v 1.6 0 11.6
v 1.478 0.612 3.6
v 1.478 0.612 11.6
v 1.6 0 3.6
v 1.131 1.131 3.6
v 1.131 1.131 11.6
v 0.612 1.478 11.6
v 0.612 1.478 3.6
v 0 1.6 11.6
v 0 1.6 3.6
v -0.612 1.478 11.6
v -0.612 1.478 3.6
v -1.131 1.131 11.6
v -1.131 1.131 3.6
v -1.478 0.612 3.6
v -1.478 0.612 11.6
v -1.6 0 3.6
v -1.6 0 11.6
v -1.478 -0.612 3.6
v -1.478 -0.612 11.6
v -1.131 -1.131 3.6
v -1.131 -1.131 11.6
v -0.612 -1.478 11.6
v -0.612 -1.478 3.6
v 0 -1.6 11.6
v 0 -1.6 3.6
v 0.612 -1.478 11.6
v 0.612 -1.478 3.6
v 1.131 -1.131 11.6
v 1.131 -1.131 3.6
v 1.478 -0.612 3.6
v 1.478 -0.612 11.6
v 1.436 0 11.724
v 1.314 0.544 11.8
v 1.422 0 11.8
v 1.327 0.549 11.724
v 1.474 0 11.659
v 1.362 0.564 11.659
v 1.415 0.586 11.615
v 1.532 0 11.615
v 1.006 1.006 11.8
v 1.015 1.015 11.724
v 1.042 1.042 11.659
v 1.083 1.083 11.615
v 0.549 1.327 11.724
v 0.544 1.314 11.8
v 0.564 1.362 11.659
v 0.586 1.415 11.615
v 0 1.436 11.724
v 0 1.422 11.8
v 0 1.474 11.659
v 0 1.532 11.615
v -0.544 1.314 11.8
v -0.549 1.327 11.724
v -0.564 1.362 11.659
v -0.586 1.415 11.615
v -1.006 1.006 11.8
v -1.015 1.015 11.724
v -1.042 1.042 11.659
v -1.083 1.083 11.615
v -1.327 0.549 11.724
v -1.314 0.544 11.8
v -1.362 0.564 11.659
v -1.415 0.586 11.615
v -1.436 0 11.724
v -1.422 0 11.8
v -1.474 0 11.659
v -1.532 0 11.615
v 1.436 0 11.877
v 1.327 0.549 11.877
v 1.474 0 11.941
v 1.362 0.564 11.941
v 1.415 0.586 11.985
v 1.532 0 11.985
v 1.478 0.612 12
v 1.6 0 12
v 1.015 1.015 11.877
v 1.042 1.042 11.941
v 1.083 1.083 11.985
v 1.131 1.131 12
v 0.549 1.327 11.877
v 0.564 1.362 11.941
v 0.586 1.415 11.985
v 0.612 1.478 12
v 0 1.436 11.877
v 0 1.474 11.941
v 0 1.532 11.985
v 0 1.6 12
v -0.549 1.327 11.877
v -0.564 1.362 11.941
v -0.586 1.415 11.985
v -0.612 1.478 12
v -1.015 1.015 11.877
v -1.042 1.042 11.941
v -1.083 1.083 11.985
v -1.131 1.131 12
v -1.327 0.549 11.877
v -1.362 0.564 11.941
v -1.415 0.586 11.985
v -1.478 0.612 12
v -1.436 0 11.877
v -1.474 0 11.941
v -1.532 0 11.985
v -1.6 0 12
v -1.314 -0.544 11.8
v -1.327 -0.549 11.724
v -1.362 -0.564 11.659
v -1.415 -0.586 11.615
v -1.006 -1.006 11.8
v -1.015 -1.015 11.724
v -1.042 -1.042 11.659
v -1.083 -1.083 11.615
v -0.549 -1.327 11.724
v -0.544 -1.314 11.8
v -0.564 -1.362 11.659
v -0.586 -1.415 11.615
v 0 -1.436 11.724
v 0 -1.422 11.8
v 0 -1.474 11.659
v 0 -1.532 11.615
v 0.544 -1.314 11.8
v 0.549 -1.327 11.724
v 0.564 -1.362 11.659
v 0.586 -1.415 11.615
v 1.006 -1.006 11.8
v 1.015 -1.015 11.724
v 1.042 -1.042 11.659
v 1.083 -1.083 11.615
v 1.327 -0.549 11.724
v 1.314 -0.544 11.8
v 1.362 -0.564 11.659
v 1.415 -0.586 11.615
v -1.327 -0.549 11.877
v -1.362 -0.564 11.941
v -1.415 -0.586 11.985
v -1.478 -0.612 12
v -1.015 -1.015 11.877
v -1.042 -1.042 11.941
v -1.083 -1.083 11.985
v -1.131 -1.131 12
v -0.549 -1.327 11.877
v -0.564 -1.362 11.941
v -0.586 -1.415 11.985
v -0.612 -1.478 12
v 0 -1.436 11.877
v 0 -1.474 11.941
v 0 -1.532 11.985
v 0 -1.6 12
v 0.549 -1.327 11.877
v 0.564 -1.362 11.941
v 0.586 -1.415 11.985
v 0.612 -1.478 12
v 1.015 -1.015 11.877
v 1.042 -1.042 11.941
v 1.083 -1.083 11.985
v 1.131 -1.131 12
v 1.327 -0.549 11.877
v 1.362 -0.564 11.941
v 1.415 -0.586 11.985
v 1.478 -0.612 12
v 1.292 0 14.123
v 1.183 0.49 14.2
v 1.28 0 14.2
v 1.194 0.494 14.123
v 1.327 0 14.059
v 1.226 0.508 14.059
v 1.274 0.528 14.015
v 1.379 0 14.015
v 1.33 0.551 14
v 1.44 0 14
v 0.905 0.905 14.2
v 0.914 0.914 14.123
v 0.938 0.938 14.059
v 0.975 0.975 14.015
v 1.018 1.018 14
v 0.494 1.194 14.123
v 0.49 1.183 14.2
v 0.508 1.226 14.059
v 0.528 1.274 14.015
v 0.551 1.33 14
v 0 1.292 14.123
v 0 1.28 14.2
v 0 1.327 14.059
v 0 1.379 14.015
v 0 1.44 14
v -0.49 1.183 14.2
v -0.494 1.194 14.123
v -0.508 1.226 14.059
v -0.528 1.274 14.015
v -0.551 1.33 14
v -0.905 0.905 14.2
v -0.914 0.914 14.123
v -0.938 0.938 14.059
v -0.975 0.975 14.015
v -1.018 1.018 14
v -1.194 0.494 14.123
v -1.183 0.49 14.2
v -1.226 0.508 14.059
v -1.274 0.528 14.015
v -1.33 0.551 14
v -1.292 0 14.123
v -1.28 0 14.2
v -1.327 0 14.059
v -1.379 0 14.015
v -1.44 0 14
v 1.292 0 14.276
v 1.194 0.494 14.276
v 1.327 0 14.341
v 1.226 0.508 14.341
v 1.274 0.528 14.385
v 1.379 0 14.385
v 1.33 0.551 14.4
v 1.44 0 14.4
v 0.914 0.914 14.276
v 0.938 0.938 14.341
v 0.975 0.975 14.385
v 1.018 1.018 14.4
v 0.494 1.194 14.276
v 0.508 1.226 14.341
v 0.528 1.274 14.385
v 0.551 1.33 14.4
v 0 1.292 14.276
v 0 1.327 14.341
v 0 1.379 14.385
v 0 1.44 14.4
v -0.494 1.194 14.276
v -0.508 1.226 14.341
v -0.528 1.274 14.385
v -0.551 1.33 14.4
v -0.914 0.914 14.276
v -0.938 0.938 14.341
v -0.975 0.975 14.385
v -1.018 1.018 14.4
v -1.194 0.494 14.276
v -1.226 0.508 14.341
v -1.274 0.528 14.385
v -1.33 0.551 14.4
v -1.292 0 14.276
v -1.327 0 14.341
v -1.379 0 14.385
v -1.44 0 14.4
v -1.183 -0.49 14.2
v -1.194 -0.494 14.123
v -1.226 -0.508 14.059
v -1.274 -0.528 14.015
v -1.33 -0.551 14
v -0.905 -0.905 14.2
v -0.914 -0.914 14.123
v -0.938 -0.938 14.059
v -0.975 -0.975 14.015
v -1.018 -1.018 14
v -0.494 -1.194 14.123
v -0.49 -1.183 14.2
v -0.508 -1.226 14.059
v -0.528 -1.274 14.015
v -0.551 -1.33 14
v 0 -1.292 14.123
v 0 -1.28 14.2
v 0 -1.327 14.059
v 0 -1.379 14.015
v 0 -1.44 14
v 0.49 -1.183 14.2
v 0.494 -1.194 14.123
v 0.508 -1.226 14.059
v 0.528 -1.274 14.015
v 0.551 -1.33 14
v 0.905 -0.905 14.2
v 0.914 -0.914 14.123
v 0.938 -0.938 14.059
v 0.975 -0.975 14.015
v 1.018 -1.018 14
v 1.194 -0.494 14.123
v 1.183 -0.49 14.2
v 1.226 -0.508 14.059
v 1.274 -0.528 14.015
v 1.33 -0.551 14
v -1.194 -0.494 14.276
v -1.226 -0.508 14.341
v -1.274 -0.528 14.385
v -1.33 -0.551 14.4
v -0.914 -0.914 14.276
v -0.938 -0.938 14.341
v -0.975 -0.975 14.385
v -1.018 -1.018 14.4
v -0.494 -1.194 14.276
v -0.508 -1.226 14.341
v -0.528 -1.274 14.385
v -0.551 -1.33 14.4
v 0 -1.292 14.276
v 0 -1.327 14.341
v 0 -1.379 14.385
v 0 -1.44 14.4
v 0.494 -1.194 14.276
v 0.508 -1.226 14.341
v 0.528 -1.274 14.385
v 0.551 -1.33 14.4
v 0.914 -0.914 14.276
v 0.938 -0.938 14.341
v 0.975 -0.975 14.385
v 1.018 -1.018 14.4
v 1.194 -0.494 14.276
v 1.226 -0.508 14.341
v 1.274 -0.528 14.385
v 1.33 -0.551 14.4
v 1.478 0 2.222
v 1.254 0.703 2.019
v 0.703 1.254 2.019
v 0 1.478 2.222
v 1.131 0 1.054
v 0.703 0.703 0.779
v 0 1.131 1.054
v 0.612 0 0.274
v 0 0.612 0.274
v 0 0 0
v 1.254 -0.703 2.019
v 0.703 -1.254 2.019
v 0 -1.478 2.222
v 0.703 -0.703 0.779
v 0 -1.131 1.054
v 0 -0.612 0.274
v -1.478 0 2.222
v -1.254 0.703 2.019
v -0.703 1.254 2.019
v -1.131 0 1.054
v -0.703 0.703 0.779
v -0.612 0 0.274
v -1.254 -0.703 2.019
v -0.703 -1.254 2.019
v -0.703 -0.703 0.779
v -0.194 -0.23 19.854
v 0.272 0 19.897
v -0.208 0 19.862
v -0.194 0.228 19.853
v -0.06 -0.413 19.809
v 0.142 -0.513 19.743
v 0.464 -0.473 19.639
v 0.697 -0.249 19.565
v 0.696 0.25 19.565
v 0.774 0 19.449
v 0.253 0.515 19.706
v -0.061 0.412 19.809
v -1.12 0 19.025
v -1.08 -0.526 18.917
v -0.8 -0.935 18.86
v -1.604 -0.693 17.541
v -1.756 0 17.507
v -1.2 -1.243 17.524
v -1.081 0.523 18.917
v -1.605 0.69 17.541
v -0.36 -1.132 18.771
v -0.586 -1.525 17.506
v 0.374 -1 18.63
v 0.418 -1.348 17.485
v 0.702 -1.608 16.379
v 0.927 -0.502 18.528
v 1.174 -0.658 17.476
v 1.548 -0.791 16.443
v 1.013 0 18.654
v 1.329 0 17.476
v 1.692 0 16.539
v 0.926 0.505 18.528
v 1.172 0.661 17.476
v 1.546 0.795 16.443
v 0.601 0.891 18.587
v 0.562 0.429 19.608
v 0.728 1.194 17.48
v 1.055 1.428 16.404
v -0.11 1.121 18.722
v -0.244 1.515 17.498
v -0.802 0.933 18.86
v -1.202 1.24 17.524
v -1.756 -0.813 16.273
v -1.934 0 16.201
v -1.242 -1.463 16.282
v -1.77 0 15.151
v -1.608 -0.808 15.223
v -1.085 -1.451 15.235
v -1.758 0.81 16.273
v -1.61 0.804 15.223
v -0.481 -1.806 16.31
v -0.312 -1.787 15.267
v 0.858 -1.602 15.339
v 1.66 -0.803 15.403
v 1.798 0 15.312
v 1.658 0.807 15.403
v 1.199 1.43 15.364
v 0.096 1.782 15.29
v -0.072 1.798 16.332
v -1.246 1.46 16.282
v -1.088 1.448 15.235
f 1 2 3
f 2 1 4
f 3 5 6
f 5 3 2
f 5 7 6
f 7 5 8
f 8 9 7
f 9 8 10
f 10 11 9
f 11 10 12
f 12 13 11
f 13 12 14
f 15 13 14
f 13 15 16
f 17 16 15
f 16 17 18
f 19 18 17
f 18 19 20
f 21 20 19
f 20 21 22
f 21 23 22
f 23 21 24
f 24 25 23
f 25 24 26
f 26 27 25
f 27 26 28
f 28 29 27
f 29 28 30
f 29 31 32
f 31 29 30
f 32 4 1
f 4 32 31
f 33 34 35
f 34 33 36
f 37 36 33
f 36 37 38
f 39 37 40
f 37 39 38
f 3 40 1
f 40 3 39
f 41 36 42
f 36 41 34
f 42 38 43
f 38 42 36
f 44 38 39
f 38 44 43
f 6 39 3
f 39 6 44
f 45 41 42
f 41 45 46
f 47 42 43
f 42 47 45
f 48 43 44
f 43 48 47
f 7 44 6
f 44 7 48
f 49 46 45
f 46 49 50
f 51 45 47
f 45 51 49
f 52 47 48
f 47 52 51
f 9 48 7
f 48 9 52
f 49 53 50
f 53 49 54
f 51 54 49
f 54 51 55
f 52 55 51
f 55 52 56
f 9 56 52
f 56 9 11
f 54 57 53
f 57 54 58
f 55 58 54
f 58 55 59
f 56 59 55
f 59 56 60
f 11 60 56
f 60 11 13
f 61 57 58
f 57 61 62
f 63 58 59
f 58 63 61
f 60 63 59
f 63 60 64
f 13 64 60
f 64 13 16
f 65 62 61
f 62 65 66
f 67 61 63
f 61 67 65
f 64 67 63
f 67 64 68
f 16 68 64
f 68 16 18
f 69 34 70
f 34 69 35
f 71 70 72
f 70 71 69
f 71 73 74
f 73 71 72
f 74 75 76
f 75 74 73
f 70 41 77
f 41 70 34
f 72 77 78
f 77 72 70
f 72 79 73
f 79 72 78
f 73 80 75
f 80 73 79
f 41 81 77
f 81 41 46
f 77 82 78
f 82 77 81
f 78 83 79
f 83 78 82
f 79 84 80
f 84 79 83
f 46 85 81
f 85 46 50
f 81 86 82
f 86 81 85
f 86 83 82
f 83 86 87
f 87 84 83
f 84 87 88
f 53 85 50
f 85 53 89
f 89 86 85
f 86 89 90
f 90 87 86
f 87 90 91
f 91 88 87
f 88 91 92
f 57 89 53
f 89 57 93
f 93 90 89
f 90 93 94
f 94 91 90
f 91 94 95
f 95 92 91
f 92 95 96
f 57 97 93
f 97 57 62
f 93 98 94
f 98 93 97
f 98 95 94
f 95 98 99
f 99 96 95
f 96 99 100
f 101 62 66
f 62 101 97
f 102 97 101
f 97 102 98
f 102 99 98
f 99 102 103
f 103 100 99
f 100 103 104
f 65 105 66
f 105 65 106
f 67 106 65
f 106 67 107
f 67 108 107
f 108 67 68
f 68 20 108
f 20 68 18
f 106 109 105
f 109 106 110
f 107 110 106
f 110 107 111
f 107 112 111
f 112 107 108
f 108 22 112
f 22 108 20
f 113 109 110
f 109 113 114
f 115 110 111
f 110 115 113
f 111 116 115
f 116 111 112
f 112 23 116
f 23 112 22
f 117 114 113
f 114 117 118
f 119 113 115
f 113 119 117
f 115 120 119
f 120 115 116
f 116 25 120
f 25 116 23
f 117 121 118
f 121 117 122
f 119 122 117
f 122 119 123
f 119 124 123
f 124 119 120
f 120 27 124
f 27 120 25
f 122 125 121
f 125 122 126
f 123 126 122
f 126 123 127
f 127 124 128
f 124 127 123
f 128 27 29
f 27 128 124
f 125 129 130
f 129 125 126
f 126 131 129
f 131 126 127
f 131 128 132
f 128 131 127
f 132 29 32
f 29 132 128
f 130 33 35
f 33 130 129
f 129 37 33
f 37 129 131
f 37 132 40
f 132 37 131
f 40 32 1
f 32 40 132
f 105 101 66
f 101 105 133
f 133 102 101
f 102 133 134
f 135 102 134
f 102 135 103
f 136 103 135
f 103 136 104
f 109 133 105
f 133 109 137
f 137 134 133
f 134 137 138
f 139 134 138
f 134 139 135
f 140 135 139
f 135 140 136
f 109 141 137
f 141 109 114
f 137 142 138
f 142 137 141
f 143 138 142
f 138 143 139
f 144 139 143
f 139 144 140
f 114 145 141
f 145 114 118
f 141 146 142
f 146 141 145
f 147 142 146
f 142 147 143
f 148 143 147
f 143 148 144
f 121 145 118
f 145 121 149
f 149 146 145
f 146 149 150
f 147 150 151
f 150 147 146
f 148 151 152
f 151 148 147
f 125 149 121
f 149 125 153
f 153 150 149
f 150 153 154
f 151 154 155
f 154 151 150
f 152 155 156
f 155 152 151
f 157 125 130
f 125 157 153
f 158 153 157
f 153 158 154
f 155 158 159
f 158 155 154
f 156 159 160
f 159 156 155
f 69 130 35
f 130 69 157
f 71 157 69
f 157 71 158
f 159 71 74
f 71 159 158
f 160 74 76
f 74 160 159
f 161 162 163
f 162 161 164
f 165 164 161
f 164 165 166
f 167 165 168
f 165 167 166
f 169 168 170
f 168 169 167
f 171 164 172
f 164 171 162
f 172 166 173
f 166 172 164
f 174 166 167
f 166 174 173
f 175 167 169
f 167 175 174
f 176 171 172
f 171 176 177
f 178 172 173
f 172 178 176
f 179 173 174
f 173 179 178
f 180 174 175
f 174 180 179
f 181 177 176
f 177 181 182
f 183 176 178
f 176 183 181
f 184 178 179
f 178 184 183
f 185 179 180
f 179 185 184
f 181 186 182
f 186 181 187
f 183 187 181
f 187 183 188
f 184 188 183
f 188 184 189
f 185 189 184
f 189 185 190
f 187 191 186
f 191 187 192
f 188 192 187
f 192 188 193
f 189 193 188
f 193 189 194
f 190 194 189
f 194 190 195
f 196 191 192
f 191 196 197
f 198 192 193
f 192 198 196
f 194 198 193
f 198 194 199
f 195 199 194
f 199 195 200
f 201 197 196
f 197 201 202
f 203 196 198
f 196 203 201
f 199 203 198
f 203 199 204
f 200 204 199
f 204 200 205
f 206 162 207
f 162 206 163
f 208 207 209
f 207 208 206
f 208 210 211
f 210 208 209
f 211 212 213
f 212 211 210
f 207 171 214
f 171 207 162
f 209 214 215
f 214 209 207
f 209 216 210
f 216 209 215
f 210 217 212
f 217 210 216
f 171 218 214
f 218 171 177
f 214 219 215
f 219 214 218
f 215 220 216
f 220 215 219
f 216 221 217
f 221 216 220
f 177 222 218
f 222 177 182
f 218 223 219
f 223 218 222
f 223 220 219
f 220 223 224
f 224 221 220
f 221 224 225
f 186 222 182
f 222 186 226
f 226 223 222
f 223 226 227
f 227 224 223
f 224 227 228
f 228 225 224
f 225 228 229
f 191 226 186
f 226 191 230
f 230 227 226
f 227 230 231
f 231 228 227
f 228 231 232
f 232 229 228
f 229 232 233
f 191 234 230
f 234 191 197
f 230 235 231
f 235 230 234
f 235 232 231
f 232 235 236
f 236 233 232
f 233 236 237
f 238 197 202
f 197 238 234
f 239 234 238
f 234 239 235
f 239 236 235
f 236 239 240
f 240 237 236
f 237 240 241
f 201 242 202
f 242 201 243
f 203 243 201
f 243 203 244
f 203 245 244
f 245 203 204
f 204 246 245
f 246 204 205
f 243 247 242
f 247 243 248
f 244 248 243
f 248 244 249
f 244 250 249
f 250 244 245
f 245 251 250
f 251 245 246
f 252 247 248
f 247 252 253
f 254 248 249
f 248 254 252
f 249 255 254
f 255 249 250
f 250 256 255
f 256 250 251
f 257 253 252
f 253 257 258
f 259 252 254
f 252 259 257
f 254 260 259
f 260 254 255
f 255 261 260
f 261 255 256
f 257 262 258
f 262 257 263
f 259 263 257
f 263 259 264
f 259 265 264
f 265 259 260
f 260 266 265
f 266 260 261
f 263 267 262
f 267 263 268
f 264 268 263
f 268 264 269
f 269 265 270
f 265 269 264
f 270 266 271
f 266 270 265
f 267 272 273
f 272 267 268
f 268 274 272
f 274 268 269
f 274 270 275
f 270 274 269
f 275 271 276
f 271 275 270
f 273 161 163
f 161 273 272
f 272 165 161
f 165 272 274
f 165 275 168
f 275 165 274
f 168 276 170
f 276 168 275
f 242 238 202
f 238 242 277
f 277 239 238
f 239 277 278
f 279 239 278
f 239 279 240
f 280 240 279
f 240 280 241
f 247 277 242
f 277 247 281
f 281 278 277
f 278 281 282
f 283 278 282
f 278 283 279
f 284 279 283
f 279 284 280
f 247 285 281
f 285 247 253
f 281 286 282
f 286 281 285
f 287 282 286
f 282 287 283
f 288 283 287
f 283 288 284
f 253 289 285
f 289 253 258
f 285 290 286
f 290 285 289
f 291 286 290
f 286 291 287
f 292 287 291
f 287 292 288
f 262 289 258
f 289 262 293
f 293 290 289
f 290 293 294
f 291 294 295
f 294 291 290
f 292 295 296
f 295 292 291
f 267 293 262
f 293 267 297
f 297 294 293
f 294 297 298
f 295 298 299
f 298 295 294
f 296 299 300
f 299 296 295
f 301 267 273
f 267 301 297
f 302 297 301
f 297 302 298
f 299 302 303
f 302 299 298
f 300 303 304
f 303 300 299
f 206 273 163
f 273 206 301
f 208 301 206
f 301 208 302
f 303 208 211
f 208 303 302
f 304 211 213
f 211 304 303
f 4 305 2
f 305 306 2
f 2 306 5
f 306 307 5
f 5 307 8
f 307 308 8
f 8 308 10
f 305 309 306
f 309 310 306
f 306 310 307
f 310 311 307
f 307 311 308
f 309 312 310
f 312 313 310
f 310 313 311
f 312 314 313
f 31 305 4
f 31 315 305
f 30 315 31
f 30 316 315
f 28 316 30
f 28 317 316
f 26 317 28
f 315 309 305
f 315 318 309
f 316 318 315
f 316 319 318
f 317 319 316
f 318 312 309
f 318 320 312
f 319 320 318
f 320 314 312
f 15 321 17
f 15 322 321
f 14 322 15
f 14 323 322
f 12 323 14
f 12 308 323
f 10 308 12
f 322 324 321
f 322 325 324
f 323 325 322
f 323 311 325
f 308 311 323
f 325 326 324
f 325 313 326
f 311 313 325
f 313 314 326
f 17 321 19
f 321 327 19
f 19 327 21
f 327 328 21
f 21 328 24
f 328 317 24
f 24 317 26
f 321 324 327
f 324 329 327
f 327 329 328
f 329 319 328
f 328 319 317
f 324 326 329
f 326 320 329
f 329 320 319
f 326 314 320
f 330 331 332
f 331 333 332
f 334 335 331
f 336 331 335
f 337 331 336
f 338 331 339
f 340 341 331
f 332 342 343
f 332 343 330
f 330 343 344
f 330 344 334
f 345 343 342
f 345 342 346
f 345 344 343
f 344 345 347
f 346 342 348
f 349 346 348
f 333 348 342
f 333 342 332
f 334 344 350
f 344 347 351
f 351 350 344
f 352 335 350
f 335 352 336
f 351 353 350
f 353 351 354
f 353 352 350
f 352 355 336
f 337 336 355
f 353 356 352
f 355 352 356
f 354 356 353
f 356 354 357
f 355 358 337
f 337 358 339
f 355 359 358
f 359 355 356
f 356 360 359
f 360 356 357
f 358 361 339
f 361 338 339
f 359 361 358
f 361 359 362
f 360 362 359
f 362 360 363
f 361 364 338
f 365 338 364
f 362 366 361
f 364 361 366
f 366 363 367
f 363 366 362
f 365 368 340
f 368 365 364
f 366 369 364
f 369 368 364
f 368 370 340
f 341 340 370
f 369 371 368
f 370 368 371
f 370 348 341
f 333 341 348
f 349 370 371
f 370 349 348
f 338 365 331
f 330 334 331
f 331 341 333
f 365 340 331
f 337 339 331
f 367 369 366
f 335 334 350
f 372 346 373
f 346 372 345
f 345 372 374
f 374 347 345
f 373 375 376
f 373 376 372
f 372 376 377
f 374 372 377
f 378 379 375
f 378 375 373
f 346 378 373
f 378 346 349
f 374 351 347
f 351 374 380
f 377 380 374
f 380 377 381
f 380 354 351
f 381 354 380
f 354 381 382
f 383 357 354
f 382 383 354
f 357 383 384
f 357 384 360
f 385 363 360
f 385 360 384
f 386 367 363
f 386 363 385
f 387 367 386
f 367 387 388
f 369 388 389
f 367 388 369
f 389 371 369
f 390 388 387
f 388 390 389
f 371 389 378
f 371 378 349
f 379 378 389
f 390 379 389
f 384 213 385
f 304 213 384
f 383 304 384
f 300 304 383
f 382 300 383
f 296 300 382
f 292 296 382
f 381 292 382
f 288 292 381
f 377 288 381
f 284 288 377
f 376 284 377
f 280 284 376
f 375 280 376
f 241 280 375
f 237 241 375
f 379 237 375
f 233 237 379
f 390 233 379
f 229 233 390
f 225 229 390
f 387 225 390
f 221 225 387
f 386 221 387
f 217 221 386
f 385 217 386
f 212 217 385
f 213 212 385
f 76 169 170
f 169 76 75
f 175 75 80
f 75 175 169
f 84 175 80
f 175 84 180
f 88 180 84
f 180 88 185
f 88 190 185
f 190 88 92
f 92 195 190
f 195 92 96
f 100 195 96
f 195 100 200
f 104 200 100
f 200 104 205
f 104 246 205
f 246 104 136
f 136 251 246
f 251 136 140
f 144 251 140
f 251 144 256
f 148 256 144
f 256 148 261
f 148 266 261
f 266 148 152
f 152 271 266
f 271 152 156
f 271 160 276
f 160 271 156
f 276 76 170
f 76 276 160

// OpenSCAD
use <../lib.scad>
use <../p/4-4con9.scad>
use <s/93552s01.scad>
use <s/93552s02.scad>
use <s/93552s03.scad>
function ldraw_lib__93552p04() = [
// 0 Minifig Paint Brush with Full Green Tip Pattern
// 0 Name: 93552p04.dat
// 0 Author: Vincent Messenet [Cheenzo]
// 0 !LDRAW_ORG Part UPDATE 2024-04
// 0 !LICENSE Licensed under CC BY 4.0 : see CAreadme.txt
// 
// 0 BFC CERTIFY CCW
  [0,"BFC","CERTIFY"],
  [0,"BFC","CCW"],
// 
// 0 !CATEGORY Minifig Accessory
// 0 !KEYWORDS BrickLink 93552pb04, Brickowl 1282719, Rebrickable 93552pat0002
// 0 !KEYWORDS set 10292, Set 10784, Set 40533, Set 40565, Set 41690, Set 41702
// 0 !KEYWORDS Set 41711, Set 60329
// 
// 0 !HISTORY 2024-05-28 [OrionP] Official Update 2024-04
// 
// 
// 1 16 0 0 0 1 0 0 0 1 0 0 0 1 s\93552s01.dat
  [1,16,0,0,0,1,0,0,0,1,0,0,0,1, ldraw_lib__s__93552s01()],
// 1 2 0 0 0 1 0 0 0 1 0 0 0 1 s\93552s02.dat
  [1,2,0,0,0,1,0,0,0,1,0,0,0,1, ldraw_lib__s__93552s02()],
// 1 2 0 0 0 1 0 0 0 1 0 0 0 1 s\93552s03.dat
  [1,2,0,0,0,1,0,0,0,1,0,0,0,1, ldraw_lib__s__93552s03()],
// 1 16 0 -30 0 0.4 0 0 0 -5 0 0 0 0.4 4-4con9.dat
  [1,16,0,-30,0,0.4,0,0,0,-5,0,0,0,0.4, ldraw_lib__4_4con9()],
];
module ldraw_lib__93552p04(step=0, col=false, unit=2/5, alt=false, line=0.2, solid=!$preview)
    makepoly(ldraw_lib__93552p04(), step=step, col=col, unit=unit, alt=alt, line=line, solid=solid);
ldraw_lib__93552p04(line=0.2);
